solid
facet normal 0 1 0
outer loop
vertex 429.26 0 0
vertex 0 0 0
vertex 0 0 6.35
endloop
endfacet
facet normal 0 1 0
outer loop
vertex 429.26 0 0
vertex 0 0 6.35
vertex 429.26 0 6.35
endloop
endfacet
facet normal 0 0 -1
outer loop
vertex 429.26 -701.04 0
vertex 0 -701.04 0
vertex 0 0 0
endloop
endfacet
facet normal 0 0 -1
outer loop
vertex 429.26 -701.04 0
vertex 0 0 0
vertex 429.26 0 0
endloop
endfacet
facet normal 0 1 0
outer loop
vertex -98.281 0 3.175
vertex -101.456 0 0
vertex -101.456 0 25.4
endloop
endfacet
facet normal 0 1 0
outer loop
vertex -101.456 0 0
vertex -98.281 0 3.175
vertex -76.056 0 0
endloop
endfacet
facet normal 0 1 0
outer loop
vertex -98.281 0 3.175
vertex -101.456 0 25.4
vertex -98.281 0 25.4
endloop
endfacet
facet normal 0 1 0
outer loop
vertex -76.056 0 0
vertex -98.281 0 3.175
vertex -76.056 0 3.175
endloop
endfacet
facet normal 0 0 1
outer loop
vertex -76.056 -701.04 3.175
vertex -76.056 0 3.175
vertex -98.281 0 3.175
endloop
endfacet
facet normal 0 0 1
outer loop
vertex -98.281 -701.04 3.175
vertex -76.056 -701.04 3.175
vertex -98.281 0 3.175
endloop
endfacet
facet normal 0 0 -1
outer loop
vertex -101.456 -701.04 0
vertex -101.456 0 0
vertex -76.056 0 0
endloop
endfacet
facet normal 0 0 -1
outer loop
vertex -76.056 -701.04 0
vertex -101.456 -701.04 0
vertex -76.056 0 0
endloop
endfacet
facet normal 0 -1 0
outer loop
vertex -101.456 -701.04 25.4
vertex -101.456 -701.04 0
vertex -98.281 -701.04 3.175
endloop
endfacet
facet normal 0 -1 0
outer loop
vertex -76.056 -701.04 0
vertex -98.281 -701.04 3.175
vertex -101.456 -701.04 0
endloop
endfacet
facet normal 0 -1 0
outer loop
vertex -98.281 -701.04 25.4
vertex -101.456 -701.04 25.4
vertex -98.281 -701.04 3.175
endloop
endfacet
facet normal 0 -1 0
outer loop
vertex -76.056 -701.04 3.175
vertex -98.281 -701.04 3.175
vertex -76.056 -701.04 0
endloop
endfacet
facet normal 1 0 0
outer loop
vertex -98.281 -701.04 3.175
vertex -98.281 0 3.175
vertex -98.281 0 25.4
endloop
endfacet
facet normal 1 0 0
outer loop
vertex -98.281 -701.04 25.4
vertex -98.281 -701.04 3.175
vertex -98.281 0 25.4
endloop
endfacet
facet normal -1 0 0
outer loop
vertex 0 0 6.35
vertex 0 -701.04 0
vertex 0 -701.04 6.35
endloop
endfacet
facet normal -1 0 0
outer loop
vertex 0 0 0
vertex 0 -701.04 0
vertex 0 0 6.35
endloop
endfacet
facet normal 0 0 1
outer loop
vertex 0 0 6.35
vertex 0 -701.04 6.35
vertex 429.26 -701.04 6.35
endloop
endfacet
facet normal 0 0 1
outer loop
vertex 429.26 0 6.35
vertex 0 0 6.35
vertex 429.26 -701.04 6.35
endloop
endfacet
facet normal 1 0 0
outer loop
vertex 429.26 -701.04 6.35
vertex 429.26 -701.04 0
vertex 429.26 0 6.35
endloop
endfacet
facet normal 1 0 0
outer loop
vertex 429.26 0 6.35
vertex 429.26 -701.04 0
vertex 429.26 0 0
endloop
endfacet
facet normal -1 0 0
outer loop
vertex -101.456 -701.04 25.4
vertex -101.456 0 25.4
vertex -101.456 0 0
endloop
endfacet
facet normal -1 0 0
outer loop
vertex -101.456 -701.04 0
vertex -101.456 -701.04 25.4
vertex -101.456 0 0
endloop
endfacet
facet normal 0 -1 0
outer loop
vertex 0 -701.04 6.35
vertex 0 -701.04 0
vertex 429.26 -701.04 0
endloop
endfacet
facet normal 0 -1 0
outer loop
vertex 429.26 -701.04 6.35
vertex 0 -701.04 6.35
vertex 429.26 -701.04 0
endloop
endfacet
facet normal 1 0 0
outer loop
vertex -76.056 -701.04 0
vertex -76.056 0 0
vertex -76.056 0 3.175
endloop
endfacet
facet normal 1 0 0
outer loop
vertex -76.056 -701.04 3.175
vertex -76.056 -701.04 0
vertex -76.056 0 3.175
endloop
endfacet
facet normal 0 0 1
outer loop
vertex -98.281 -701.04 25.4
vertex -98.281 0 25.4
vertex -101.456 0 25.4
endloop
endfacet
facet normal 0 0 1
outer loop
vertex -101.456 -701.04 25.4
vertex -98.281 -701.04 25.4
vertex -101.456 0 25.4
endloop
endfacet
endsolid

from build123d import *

# Parameters (mm, degrees)
F0_W     = 429.26
F0_H     = 701.04
F1_DEPTH = 6.35
F3_DEPTH = 701.04


# Not quite as in the source:
# - the program builds the solid bodies; features that only make, move or delete a surface that nothing else refers to are left out


with BuildPart() as f1:
    # F0 (on Top) → F1 (new body)
    with BuildSketch(Plane.XY):
        with Locations((214.63, -350.52)):
            Rectangle(F0_W, F0_H)
    extrude(amount=F1_DEPTH)


with BuildPart() as f3:
    # F2 (on Front) → F3 (new body)
    with BuildSketch(Plane.XZ):
        Polygon((-101.4562074584, 25.4), (-101.4562074584, 0), (-76.0562074584, 0), (-76.0562074584, 3.175), (-98.2812074584, 3.175), (-98.2812074584, 25.4), align=None)
    extrude(amount=F3_DEPTH)


solid = Compound([f1.part, f3.part])
